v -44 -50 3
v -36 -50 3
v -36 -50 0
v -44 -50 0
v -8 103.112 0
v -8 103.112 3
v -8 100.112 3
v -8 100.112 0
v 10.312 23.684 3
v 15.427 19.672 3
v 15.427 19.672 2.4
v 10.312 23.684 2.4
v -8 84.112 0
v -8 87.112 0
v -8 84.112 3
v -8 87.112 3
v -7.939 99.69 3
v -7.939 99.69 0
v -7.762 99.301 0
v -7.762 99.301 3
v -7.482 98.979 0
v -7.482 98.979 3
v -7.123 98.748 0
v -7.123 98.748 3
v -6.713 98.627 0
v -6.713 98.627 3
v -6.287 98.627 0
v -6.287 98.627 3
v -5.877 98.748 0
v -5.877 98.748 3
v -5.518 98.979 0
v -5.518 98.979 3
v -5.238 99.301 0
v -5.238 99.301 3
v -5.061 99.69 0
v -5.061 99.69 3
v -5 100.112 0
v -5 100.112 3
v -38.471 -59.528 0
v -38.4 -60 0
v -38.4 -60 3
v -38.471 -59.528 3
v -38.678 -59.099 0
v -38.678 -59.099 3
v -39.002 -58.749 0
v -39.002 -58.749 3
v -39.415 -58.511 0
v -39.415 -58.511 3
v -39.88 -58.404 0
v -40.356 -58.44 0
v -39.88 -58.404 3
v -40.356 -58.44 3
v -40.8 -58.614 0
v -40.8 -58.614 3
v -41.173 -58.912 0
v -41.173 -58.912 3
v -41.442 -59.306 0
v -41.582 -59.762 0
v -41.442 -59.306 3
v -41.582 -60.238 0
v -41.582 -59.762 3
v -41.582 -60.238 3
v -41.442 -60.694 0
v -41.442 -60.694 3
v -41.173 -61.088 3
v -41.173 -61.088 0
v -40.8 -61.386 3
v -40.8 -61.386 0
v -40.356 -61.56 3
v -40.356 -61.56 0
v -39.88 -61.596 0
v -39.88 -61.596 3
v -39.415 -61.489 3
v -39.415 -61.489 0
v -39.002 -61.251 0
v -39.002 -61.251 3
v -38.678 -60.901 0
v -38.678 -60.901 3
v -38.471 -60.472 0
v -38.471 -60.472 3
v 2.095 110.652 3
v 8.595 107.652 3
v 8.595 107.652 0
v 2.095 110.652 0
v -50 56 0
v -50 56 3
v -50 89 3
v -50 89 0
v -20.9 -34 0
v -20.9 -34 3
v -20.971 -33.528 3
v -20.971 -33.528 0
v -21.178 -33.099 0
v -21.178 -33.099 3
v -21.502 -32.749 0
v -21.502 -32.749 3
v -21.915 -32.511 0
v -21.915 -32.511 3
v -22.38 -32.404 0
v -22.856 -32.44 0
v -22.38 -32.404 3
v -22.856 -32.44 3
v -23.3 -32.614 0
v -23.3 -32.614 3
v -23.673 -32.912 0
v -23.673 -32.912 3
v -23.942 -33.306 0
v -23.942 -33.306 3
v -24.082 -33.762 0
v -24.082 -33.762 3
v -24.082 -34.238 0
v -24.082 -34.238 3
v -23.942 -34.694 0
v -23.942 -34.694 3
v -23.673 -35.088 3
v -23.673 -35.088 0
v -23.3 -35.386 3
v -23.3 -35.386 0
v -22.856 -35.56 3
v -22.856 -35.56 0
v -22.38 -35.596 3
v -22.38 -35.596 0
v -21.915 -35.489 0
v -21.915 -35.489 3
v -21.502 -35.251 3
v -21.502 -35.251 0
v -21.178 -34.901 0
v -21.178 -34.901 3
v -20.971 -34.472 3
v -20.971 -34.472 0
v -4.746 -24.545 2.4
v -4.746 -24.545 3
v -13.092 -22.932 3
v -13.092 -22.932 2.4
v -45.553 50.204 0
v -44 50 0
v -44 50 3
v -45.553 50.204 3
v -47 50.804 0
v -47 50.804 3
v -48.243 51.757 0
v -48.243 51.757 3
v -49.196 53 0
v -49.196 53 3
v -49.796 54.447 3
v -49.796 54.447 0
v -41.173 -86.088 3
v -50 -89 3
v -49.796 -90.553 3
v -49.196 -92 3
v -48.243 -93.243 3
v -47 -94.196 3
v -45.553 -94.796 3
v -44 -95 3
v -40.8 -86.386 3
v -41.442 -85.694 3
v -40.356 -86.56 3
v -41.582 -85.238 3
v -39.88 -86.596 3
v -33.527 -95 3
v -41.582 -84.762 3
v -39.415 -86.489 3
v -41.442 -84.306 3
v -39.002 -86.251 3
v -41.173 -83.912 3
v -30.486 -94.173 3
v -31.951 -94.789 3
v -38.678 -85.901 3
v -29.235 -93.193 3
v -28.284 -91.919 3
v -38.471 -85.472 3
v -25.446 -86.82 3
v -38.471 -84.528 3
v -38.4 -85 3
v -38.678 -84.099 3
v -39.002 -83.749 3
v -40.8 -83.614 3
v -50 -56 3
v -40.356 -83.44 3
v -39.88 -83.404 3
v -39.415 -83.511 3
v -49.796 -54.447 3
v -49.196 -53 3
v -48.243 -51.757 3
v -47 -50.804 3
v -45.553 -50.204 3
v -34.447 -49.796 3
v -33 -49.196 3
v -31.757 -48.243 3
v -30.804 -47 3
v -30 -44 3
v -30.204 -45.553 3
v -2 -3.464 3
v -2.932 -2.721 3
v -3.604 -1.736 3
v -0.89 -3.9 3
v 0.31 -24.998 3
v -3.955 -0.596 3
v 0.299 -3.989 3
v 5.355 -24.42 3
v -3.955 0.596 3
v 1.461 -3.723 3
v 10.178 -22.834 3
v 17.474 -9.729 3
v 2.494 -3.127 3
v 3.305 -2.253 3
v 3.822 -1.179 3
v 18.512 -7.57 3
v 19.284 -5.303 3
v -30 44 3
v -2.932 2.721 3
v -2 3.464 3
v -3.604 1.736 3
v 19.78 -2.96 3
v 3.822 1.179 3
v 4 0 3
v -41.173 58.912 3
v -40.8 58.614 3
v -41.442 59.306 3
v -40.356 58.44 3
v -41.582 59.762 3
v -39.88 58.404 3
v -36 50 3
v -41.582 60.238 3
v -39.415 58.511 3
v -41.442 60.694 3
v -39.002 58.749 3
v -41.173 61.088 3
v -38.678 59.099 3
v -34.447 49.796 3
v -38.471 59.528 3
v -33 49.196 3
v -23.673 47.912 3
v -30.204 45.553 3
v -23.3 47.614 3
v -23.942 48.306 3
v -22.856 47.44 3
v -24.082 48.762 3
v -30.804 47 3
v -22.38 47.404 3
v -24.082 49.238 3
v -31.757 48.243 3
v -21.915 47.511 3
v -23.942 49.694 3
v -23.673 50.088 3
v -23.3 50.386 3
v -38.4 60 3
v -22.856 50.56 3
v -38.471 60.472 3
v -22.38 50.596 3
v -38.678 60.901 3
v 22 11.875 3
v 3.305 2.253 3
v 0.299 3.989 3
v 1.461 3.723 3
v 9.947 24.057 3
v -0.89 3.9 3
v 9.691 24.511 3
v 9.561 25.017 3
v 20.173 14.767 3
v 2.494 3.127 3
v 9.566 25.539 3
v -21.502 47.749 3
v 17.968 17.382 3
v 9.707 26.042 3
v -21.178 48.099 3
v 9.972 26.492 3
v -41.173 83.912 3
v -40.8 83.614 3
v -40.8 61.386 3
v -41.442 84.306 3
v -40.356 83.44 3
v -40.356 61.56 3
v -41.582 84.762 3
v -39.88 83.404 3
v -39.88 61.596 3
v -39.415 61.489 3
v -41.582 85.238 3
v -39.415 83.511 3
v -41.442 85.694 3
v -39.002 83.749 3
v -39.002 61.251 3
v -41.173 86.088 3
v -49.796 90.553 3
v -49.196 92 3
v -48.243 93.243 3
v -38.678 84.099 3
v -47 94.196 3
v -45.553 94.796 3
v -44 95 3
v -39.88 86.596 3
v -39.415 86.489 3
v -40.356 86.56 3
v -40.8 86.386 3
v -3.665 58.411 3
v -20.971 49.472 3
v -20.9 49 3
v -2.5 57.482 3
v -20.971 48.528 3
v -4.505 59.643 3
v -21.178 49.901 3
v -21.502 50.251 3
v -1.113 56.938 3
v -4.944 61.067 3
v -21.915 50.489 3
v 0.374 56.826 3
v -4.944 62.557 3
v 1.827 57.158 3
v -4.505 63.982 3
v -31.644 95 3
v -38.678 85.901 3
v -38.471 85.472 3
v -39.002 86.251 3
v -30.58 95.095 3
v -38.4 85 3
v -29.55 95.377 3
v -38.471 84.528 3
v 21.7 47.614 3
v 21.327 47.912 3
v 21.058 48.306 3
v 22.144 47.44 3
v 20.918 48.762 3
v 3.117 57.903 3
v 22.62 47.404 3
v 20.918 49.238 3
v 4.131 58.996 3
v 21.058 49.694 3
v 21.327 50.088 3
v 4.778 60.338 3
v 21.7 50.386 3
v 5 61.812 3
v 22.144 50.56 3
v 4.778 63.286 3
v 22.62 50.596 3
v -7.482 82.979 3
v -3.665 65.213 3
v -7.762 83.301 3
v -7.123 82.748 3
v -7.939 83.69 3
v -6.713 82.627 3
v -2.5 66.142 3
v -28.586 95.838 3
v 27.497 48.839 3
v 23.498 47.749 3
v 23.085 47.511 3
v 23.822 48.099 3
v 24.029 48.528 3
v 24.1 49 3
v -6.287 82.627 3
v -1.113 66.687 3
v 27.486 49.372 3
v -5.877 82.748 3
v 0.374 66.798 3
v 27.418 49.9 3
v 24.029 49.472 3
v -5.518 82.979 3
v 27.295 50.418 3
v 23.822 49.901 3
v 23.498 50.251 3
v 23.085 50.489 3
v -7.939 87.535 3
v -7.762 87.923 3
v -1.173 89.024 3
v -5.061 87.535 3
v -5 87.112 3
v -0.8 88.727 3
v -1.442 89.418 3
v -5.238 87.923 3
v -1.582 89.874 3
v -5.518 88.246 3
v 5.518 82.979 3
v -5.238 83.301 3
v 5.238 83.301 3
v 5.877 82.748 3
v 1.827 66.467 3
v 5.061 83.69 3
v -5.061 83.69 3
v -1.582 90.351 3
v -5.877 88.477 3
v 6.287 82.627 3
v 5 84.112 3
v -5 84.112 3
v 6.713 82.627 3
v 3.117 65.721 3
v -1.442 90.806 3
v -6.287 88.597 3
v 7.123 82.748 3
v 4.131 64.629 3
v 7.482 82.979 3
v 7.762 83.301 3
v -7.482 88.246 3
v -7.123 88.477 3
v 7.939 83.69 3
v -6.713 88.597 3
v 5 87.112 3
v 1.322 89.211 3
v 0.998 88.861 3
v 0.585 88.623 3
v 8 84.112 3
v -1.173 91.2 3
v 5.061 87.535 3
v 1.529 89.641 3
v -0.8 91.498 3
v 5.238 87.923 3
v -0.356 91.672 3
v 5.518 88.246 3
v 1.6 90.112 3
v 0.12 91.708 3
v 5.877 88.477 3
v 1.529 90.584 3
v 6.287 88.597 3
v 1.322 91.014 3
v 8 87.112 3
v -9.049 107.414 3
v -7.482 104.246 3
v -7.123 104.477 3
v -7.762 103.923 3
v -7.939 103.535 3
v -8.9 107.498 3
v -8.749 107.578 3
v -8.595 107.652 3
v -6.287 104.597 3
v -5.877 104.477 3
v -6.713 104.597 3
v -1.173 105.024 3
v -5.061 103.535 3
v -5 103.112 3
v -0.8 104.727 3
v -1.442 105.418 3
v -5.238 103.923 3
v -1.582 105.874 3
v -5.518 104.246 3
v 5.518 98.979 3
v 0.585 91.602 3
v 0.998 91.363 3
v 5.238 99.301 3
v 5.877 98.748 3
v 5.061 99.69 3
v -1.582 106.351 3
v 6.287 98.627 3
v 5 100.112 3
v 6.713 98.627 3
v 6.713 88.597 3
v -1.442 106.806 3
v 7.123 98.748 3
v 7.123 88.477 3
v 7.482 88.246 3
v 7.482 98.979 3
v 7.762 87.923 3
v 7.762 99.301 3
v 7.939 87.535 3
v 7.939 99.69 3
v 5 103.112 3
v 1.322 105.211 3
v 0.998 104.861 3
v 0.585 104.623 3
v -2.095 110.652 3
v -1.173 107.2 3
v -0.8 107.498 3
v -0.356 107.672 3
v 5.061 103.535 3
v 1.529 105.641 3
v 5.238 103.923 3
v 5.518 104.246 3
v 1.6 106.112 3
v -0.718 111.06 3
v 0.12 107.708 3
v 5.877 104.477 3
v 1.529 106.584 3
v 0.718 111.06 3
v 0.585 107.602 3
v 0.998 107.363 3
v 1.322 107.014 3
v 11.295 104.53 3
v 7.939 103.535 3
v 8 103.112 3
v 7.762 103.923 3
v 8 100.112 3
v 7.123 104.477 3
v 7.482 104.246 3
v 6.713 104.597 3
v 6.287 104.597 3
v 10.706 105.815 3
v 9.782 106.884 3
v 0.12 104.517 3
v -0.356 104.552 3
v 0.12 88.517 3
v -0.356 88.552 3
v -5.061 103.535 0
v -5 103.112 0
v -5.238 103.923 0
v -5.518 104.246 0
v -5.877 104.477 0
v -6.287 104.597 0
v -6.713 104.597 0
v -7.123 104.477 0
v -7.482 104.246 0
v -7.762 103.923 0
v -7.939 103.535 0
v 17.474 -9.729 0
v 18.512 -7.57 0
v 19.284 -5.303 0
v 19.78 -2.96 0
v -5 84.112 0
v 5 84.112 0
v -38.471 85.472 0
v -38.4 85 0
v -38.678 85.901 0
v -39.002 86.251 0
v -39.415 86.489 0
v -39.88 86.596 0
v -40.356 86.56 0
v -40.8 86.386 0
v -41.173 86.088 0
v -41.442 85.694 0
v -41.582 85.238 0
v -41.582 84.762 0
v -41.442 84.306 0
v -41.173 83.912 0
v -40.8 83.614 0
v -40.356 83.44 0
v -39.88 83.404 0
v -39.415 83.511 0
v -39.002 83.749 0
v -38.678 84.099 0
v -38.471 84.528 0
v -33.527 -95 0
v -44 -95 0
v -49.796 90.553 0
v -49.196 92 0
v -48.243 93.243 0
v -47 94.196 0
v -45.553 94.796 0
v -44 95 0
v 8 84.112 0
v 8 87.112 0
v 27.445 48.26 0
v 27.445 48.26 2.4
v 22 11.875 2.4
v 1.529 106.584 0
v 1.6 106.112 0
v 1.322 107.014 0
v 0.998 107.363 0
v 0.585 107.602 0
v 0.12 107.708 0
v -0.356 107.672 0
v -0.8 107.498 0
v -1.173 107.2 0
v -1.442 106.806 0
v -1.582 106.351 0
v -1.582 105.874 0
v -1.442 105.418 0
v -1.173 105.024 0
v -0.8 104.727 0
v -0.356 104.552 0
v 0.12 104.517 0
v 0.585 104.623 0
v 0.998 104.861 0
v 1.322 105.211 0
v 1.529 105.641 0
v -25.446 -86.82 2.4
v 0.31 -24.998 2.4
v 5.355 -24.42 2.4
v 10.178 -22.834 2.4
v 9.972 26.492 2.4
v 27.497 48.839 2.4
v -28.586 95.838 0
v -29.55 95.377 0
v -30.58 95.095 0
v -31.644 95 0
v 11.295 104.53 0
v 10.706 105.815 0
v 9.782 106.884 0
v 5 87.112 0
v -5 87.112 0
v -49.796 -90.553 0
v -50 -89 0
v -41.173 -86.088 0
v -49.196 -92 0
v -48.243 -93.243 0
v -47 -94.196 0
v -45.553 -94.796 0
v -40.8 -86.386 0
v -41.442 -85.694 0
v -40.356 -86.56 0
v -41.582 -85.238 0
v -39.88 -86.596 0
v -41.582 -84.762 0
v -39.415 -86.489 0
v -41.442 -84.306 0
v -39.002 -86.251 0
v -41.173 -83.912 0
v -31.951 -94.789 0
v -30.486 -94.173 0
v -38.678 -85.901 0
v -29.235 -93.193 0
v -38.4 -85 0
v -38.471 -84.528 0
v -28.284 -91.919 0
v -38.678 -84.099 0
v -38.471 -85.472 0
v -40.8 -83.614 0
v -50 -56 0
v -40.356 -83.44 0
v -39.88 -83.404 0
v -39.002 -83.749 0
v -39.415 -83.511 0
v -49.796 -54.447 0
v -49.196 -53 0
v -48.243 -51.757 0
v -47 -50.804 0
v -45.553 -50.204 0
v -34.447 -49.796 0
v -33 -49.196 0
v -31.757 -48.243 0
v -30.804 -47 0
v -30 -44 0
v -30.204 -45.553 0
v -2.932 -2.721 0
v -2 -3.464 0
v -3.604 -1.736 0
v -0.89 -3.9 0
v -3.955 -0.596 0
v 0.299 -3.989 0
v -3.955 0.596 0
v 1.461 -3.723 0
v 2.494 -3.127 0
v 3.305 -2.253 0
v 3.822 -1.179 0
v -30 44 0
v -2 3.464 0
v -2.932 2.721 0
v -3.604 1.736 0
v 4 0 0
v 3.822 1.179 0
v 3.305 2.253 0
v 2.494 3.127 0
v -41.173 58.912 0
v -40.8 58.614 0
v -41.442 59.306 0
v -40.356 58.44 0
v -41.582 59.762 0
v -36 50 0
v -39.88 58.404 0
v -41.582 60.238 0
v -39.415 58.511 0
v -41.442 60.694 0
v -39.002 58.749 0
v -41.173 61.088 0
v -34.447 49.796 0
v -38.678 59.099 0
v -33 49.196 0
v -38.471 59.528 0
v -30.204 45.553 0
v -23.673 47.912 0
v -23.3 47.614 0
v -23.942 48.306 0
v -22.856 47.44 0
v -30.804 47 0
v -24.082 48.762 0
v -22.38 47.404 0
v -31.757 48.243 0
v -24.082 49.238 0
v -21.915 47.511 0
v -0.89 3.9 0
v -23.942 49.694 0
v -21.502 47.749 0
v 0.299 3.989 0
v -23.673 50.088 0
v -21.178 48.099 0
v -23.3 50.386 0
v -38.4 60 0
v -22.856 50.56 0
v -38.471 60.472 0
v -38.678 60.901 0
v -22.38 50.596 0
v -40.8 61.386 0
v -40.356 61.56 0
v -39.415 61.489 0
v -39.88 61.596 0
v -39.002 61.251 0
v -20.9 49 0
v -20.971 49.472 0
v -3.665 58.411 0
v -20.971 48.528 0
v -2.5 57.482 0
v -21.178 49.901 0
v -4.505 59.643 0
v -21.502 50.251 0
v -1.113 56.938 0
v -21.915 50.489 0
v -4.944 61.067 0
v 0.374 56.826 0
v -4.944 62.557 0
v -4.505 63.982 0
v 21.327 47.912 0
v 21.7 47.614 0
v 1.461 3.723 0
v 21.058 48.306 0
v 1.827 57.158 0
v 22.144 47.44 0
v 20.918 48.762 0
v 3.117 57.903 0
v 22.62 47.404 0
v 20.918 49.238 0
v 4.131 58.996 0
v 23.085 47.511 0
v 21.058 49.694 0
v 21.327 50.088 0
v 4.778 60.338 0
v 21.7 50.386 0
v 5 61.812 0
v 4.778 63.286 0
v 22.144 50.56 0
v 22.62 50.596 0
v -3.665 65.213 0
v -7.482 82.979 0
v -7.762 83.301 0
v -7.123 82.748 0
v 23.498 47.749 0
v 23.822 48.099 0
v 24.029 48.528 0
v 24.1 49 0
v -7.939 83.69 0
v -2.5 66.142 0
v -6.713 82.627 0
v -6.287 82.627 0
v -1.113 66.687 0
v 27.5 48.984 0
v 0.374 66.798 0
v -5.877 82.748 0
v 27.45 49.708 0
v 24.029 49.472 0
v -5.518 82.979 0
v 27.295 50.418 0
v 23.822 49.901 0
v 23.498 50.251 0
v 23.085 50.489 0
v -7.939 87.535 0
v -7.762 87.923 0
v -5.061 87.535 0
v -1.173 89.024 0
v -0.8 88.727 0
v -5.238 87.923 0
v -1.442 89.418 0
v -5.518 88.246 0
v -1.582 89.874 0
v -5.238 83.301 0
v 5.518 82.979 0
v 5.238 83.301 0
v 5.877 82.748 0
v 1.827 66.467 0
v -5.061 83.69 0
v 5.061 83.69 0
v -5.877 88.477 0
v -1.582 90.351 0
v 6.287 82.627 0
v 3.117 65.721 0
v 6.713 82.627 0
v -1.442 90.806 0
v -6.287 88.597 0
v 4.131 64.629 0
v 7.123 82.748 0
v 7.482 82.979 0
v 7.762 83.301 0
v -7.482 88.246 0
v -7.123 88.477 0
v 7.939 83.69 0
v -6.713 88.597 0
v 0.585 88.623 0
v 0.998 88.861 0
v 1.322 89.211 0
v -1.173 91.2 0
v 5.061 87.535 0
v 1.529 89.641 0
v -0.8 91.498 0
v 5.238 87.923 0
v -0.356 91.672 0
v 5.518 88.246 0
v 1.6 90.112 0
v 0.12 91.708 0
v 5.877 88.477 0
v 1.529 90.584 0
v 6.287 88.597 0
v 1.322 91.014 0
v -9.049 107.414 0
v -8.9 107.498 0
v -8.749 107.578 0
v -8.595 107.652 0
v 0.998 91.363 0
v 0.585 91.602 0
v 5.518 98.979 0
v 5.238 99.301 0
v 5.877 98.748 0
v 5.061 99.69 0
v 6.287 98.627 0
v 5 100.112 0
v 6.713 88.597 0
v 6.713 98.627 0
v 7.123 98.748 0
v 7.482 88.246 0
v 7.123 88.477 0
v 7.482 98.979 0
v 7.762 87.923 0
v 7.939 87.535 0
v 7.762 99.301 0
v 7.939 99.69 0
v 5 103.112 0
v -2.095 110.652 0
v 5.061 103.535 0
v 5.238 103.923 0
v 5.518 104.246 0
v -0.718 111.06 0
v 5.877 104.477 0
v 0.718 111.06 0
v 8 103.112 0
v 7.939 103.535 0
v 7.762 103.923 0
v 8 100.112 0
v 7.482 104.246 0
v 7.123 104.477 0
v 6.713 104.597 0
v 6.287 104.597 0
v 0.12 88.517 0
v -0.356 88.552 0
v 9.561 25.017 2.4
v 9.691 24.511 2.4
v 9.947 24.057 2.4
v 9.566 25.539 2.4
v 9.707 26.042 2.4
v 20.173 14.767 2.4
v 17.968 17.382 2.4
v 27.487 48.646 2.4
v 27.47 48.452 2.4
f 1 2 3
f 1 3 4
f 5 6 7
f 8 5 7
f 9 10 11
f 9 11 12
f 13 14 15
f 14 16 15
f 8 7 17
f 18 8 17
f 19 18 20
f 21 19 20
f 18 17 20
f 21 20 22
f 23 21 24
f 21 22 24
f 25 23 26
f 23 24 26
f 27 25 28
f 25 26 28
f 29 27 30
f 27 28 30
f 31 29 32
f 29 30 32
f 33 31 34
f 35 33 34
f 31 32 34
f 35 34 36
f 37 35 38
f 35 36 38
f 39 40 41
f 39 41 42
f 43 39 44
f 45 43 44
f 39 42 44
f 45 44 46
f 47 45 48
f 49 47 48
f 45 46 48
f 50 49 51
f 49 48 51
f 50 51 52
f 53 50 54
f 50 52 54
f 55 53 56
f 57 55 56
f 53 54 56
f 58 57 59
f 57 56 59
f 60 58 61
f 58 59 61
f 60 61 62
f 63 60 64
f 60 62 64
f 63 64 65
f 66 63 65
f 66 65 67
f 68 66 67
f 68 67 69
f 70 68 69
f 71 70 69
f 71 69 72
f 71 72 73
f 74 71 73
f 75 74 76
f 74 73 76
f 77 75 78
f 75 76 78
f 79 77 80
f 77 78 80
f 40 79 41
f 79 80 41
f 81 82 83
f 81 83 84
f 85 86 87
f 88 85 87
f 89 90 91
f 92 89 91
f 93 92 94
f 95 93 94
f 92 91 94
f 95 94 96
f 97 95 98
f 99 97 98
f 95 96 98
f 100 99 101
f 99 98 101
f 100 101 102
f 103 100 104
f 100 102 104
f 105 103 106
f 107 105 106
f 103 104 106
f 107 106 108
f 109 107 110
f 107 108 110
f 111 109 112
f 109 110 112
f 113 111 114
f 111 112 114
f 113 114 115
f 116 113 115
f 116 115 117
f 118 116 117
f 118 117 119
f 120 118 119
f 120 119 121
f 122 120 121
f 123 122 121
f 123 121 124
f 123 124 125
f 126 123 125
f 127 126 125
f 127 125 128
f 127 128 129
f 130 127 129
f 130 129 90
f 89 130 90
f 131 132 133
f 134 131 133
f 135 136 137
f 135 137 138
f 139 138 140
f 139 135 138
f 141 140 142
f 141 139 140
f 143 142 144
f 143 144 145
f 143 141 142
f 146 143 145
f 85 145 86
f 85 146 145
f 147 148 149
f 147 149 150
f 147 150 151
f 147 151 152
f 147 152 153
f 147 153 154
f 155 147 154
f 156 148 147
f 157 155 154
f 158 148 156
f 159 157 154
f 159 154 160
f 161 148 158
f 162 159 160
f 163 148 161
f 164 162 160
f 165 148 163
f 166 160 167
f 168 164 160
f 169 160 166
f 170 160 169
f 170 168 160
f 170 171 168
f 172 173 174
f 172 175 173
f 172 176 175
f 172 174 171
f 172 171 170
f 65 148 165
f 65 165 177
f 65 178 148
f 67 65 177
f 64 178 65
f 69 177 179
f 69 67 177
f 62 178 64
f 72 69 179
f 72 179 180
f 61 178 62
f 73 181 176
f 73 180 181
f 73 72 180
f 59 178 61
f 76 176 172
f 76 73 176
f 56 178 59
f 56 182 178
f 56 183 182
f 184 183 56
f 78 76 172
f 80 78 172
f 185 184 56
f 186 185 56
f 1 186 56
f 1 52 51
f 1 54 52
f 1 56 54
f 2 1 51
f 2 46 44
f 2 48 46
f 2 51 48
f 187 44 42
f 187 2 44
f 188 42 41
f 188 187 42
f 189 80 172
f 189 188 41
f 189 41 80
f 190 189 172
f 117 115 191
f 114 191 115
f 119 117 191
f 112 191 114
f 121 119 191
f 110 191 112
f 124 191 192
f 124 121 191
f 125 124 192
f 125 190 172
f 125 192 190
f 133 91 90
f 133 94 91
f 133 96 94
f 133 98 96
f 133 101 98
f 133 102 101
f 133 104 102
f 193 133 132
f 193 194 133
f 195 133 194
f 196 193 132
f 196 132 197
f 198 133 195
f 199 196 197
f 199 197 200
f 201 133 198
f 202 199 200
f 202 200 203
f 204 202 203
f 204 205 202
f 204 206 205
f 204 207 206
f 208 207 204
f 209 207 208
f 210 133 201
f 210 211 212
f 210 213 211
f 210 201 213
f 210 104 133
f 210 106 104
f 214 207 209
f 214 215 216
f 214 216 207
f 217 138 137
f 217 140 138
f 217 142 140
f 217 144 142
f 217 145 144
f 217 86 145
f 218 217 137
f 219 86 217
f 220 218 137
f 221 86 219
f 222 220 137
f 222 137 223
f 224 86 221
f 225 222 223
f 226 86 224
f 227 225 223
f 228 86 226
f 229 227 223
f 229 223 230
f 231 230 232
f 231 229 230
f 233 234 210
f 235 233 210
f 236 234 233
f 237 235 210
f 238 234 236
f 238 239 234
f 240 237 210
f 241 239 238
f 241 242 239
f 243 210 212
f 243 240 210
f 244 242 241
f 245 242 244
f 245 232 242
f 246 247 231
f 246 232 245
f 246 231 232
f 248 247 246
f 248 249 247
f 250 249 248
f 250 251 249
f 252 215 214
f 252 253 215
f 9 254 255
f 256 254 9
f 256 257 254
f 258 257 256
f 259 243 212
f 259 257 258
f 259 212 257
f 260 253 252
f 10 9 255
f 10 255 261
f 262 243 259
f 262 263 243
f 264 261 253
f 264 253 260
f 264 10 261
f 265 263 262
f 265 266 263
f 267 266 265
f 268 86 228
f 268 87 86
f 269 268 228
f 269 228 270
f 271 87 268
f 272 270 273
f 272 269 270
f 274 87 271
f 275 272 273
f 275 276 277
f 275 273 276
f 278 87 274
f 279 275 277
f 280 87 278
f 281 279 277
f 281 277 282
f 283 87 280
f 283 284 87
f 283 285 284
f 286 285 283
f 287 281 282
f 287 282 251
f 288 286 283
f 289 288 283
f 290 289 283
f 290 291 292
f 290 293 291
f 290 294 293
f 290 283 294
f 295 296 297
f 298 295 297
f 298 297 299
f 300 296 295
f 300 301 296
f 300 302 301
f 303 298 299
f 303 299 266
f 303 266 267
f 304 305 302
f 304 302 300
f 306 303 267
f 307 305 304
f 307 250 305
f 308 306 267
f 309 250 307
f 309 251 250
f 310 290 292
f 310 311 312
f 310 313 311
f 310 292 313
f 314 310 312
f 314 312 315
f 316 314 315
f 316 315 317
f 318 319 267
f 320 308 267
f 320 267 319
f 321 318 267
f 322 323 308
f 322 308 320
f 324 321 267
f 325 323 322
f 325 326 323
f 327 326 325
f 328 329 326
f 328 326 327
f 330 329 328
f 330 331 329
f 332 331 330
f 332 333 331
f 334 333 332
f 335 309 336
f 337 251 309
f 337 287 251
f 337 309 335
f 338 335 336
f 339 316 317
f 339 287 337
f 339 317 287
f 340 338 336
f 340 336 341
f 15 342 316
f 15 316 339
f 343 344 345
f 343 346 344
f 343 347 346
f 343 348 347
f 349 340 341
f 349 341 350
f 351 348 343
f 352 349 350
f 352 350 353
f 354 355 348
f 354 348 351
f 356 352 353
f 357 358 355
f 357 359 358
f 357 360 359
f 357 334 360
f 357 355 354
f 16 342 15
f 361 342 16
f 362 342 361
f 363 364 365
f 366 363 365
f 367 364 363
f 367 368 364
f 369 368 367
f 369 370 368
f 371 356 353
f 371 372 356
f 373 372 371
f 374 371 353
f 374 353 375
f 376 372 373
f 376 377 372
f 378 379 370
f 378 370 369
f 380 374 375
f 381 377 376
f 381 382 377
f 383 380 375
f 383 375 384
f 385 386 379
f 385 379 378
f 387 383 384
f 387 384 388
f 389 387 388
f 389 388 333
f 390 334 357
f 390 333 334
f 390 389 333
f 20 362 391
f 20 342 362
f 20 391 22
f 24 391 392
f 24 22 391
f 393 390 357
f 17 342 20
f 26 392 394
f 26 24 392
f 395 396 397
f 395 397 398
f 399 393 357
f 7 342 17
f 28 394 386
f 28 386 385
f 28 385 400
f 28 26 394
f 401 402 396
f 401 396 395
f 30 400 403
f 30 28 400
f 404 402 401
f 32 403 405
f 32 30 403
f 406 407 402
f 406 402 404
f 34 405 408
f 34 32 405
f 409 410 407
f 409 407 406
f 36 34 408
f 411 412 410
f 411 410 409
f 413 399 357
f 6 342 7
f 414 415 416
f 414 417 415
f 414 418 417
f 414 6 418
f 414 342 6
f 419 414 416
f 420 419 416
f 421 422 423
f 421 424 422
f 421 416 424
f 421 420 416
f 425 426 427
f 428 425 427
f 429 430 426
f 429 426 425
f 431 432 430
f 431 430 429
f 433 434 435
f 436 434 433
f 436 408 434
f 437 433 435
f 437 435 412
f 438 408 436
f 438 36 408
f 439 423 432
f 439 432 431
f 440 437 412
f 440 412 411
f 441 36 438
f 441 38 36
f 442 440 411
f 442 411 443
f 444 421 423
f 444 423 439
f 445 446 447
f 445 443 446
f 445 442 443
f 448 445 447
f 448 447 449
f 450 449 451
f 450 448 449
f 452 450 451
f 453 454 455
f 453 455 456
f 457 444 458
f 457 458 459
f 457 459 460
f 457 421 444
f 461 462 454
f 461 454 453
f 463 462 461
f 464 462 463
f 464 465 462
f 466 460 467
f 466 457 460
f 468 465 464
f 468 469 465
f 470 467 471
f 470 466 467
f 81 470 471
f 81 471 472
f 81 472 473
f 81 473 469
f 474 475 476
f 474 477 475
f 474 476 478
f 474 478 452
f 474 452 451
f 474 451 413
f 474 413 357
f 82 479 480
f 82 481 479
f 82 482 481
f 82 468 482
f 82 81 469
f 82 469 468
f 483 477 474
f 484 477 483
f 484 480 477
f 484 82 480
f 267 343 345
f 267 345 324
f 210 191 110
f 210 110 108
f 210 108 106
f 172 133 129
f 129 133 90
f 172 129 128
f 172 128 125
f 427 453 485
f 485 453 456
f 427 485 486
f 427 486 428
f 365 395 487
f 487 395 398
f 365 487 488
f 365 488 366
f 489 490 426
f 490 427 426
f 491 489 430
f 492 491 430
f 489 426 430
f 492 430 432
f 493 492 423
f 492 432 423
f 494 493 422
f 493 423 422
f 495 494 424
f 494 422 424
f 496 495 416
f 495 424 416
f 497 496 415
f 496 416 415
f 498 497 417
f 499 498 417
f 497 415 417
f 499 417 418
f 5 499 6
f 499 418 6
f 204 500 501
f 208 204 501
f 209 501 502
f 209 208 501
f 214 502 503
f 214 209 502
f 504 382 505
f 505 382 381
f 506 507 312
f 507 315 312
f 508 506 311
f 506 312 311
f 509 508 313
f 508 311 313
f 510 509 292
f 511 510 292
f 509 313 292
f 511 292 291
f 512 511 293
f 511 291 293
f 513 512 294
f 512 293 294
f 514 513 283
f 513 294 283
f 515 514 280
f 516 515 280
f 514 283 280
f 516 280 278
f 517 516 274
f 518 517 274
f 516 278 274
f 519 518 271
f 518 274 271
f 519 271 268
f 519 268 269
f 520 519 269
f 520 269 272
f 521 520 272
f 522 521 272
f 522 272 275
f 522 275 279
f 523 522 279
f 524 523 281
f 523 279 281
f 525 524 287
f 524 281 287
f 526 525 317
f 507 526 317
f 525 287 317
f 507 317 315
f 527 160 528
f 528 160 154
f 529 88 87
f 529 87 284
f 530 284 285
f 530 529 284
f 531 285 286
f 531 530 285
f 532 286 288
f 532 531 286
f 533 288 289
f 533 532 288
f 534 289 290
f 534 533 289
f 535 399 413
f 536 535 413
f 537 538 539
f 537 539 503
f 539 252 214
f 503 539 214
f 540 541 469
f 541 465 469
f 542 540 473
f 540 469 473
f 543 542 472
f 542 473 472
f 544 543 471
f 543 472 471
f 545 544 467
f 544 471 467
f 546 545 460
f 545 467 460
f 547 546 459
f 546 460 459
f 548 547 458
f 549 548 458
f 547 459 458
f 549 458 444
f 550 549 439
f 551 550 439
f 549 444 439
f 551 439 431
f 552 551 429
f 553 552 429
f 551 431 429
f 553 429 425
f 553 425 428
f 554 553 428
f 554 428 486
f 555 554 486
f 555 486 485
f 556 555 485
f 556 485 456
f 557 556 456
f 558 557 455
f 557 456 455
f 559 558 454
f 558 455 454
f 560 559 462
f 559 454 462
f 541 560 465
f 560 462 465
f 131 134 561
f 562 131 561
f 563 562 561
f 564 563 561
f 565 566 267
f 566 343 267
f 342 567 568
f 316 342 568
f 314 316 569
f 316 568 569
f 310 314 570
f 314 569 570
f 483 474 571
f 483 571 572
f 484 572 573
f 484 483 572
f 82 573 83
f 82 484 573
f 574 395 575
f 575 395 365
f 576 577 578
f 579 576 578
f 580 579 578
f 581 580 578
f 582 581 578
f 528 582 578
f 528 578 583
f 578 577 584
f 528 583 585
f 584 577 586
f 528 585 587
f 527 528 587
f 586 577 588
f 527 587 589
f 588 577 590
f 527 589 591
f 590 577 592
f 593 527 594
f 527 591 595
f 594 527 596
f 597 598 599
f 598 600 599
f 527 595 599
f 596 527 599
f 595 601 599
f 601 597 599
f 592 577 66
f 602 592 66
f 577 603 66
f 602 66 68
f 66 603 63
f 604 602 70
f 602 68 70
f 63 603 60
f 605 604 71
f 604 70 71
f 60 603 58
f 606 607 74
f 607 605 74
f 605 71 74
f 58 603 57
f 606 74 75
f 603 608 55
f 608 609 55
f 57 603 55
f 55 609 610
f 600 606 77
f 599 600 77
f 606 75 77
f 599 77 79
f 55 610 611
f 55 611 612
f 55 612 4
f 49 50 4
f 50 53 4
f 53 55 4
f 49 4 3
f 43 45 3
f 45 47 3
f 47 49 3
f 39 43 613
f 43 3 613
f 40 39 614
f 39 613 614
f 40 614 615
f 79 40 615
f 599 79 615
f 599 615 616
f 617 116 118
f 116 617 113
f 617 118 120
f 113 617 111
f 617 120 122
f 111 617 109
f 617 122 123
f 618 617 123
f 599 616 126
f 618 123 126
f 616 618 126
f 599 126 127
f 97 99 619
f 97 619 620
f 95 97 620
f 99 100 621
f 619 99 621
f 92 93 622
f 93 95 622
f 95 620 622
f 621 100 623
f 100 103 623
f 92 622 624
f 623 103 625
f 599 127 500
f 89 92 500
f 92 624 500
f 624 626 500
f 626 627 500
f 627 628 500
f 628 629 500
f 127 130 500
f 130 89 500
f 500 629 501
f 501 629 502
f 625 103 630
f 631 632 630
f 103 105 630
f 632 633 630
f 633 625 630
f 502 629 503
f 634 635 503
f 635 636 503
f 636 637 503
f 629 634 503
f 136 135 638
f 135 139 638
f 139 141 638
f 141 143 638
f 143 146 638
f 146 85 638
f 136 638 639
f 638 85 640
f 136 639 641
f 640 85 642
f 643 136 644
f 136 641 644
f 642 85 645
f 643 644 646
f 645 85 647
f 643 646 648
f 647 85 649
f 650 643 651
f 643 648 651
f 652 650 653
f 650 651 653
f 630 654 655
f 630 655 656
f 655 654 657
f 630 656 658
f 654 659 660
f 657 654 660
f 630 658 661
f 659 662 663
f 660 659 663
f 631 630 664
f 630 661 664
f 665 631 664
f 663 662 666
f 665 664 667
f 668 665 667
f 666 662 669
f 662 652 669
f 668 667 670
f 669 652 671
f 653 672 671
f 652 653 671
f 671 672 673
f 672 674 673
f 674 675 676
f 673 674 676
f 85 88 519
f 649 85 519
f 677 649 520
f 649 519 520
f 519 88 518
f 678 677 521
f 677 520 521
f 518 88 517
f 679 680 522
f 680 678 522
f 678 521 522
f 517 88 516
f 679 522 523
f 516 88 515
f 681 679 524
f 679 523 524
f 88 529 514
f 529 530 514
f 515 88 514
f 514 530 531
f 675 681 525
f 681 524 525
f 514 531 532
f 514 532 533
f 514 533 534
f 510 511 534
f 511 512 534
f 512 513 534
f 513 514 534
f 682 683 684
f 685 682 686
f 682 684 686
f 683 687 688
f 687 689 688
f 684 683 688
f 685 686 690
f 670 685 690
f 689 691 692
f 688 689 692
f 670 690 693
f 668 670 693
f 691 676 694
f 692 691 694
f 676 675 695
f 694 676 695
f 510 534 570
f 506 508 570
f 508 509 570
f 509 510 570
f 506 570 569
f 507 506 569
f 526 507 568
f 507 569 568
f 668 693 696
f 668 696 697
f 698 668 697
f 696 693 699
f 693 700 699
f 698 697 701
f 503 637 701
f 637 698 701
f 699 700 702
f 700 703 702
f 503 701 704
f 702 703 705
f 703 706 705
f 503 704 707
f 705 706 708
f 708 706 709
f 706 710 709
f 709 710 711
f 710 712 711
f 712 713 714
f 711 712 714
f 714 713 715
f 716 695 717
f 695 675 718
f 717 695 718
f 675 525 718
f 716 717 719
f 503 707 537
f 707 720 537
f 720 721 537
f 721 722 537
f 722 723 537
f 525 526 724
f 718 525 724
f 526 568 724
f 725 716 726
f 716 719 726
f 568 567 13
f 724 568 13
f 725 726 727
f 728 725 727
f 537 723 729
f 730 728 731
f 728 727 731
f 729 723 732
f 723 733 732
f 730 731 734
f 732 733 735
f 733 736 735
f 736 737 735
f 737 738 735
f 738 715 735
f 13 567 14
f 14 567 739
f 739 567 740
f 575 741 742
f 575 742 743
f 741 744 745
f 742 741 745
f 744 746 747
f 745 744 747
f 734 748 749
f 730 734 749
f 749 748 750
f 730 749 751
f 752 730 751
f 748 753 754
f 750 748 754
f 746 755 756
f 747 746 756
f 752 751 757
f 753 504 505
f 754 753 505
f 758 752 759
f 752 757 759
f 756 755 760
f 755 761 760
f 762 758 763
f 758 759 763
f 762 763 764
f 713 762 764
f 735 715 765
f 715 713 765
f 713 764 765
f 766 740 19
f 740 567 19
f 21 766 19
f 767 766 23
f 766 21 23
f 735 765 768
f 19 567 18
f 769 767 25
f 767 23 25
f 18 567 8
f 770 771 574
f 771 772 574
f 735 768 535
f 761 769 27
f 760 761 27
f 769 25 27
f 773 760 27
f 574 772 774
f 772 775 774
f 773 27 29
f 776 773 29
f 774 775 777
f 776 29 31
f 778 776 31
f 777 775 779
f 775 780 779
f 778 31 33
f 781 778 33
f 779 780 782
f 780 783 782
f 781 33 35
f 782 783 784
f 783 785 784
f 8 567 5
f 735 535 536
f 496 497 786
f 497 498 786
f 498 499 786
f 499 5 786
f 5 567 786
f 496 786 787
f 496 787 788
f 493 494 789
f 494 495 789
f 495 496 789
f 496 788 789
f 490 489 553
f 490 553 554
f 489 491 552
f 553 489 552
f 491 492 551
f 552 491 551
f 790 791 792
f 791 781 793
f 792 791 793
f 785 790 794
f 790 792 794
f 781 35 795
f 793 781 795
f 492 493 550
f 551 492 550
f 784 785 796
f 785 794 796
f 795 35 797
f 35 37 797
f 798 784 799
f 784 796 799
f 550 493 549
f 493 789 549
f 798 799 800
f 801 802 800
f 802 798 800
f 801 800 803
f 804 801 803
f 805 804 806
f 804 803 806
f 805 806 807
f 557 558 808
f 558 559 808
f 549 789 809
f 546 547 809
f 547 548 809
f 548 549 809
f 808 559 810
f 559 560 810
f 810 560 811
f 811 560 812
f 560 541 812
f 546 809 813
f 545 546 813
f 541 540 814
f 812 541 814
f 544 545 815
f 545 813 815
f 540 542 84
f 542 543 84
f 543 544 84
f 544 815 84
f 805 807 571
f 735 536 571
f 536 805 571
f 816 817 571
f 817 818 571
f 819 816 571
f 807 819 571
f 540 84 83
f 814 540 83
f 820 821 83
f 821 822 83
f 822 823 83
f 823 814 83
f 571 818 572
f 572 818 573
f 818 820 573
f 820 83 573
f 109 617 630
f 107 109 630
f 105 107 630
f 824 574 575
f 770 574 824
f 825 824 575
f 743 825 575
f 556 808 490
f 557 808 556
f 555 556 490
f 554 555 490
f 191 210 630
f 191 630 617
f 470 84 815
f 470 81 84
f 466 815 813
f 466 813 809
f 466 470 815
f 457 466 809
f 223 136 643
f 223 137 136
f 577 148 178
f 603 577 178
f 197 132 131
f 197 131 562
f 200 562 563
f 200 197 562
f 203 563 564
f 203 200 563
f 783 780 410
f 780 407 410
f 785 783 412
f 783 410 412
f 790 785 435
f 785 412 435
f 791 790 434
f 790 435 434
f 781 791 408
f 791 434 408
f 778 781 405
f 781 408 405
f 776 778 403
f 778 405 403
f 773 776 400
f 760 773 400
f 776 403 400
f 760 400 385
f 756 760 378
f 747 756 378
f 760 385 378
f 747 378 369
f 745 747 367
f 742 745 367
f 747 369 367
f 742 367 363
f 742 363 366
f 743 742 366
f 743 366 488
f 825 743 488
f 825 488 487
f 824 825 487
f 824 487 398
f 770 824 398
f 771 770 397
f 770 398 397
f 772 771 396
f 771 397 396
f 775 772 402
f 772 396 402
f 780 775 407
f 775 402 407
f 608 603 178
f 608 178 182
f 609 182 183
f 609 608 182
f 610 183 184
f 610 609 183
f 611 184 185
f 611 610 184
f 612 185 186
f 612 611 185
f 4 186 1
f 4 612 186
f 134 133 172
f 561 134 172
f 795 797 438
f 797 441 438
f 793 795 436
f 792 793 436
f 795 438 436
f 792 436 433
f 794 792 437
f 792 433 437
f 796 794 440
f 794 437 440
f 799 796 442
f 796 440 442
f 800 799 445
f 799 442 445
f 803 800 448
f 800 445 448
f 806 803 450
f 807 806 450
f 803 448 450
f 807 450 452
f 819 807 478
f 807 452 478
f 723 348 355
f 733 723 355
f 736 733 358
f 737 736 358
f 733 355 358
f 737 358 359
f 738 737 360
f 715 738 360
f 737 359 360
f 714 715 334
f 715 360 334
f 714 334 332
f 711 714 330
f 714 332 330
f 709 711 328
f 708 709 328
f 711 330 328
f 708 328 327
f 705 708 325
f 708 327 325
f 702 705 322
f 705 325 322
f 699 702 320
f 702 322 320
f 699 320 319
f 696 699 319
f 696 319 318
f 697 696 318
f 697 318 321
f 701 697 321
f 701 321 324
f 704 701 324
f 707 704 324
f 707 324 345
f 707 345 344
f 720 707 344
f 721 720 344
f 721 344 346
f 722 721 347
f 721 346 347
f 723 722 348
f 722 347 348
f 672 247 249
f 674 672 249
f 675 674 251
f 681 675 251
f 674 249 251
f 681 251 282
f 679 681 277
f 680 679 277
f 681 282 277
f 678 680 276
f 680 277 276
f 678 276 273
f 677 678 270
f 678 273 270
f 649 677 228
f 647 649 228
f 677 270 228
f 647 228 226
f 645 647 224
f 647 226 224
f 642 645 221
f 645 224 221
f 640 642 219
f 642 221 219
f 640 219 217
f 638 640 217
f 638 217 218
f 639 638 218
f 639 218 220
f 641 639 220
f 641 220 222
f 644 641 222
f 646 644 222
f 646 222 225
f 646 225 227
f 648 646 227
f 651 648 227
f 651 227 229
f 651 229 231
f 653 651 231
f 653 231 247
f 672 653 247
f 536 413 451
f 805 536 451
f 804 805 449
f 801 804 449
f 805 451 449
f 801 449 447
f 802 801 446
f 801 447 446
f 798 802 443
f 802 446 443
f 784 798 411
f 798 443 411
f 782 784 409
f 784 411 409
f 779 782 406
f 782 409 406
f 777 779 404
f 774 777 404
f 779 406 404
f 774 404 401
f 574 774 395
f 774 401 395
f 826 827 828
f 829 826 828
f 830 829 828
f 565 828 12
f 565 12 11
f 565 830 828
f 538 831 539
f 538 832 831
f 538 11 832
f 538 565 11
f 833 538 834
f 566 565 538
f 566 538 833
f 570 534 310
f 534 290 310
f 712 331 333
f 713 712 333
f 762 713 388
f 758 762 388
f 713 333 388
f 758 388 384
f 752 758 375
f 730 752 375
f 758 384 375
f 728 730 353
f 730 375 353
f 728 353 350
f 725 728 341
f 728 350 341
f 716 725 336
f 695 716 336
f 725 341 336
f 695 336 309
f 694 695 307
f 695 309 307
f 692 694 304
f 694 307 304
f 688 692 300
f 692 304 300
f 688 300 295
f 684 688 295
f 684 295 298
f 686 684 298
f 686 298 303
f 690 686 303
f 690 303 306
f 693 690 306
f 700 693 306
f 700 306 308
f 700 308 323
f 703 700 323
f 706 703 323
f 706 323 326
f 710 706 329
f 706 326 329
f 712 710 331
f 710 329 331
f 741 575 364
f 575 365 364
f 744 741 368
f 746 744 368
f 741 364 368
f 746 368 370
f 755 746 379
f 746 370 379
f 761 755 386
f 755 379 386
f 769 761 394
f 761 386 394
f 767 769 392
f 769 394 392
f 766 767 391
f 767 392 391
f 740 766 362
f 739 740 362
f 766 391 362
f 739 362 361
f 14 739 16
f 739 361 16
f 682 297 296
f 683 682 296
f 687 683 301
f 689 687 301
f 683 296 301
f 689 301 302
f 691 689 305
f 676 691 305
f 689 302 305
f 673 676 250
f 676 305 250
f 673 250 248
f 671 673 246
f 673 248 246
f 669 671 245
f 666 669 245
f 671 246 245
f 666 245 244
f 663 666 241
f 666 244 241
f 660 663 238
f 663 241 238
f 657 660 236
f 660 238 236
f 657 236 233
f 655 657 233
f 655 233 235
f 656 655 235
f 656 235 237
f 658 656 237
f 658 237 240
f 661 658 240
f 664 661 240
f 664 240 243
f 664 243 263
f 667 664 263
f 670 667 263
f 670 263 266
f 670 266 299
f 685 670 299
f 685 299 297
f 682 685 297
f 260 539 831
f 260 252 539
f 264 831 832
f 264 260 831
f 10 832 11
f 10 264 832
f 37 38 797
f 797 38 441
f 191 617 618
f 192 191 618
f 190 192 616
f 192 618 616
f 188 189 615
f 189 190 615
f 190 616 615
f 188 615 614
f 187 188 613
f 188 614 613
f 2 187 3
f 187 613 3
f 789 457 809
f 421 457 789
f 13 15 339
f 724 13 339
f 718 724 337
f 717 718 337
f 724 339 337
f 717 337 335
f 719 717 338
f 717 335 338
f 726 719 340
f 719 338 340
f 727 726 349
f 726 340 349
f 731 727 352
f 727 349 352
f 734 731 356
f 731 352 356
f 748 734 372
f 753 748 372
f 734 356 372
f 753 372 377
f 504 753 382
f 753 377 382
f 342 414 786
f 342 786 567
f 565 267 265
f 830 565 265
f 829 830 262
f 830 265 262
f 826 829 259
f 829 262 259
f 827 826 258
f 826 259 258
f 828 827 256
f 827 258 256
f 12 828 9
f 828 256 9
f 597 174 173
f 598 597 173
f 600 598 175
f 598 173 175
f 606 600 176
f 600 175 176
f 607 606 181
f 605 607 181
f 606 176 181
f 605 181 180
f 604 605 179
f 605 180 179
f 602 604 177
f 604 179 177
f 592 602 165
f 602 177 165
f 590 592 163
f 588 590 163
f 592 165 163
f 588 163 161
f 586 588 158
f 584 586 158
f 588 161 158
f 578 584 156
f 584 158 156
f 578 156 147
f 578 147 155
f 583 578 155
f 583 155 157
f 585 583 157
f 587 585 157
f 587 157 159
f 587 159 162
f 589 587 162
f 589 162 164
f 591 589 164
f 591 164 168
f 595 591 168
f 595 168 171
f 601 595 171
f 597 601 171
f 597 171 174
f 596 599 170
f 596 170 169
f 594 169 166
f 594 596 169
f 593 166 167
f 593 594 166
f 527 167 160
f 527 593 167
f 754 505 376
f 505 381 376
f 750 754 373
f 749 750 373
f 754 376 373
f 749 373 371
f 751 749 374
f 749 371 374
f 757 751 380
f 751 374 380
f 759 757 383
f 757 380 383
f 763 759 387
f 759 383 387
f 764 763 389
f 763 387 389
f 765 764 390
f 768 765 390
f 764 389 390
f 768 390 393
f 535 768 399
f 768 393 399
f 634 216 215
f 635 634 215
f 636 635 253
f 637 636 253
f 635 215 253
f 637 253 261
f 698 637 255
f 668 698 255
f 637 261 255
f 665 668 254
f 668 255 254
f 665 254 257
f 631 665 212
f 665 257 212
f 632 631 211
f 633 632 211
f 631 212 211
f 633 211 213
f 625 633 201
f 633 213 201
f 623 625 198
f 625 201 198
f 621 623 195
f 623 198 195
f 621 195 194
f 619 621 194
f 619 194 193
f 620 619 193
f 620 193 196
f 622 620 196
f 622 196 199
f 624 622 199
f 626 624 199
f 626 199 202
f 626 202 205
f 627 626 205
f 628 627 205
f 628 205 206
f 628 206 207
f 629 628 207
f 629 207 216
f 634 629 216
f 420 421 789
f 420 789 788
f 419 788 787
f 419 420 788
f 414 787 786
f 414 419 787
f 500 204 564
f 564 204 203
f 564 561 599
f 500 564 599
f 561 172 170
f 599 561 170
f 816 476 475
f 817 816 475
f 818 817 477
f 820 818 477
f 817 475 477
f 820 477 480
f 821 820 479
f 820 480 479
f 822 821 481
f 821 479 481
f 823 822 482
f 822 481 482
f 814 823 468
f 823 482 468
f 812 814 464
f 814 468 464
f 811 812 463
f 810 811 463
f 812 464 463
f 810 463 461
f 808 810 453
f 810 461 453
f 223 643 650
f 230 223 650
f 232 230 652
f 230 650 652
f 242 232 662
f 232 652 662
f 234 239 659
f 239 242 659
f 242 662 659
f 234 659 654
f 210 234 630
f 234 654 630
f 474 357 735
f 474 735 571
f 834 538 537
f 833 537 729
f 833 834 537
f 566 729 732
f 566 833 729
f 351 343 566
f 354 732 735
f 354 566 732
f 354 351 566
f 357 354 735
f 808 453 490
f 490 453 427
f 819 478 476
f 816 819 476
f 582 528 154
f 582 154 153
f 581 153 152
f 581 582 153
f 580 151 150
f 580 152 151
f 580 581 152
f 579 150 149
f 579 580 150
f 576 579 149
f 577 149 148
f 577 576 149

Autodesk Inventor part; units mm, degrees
ref_plane "YZ Plane" through (0, 0, 0) normal (1, 0, 0) x (0, 1, 0)
ref_plane "XZ Plane" through (0, 0, 0) normal (0, 1, 0) x (-1, 0, 0)
ref_plane "XY Plane" through (0, 0, 0) normal (0, 0, 1) x (1, 0, 0)
sketch "スケッチ1" plane through (0, 0, 0) normal (0, 0, 1) x (1, 0, 0)
  arc A0 (0, -120) -> (0, 120) centre (0, 0) ccw
  line L0 (0, 120) -> (0, -120)
  dimension "d0" = 120
extrude "押し出し1" add sketch "スケッチ1" along normal blind 3
sketch "スケッチ2" plane through (0, 0, 0) normal (0, 0, -1) x (-1, 0, 0)
  line L0 (0, 120) -> (0, -120) projected
  line L1 (0, 120) -> (50, 120)
  line L2 (50, 120) -> (50, -120)
  line L3 (50, -120) -> (0, -120)
  line L4 (0, -120) -> (0, 120)
  point P0 (0, 0)
  dimension "d3" = 50
extrude "押し出し2" add sketch "スケッチ2" against normal blind 3
sketch "スケッチ3" plane through (0, 0, 3) normal (0, 0, 1) x (1, 0, 0)
  line L0 (-50, 120) -> (-50, -120) projected
  line L1 (-50, 40) -> (-40, 40)
  line L2 (-40, 40) -> (-40, -40)
  line L3 (-40, -40) -> (-50, -40)
  line L4 (-50, -40) -> (-50, 40)
  line L5 (-40, 60) -> (-40, -60) construction
  circle A0 centre (-40, 60) radius 1.6
  circle A1 centre (-40, -60) radius 1.6
  point P0 (0, 0)
  point P1 (-50, 0)
  point P2 (-40, 0)
  point P3 (-40, 0)
  dimension "d8" = 10
  dimension "d9" = 80
  dimension "d10" = 120
  dimension "d11" = 10
  dimension "d12" = 3.2
  dimension "d13" = 3.2
extrude "押し出し3" cut sketch "スケッチ3" against normal through all
sketch "スケッチ4" plane through (0, 0, 3) normal (0, 0, 1) x (1, 0, 0)
  circle A0 centre (0, 0) radius 4
  dimension "d14" = 8
extrude "押し出し4" cut sketch "スケッチ4" against normal blind 3
sketch "スケッチ5" plane through (0, 0, 3) normal (0, 0, 1) x (1, 0, 0)
  circle A0 centre (0, 61.8122) radius 3 projected
  circle A1 centre (0, 61.8122) radius 5
  point P0 (0, 0)
  dimension "d17" = 10
extrude "押し出し5" cut sketch "スケッチ5" against normal blind 3 contours A0 | A1
sketch "スケッチ7" plane through (0, 0, 3) normal (0, 0, 1) x (1, 0, 0)
  line L0 (15.7, 89.1122) -> (-15.7, 89.1122) projected
  line L1 (8, 87.1122) -> (-8, 87.1122)
  line L2 (-8, 87.1122) -> (-8, 84.1122)
  line L3 (-8, 84.1122) -> (8, 84.1122)
  line L4 (8, 84.1122) -> (8, 87.1122)
  arc A0 (-8, 84.1122) -> (-5, 84.1122) centre (-6.5, 84.1122) ccw
  arc A1 (5, 84.1122) -> (8, 84.1122) centre (6.5, 84.1122) ccw
  arc A2 (8, 87.1122) -> (5, 87.1122) centre (6.5, 87.1122) ccw
  arc A3 (-5, 87.1122) -> (-8, 87.1122) centre (-6.5, 87.1122) ccw
  circle A4 centre (0, 90.1122) radius 1.6
  point P0 (0, 0)
  point P1 (0, 87.1122)
  point P2 (0, 89.1122)
  dimension "d20" = 2
  dimension "d21" = 16
  dimension "d22" = 3
  dimension "d23" = 1.5
  dimension "d26" = 3.2
  dimension "d27" = 3
extrude "押し出し6" cut sketch "スケッチ7" against normal blind 3
pattern_linear "矩形状パターン1" count 2 spacing 16 along (0, 1, 0) of "押し出し6"
sketch "スケッチ9" plane through (0, 0, 3) normal (0, 0, 1) x (1, 0, 0)
  circle A0 centre (0, 61.8122) radius 4 construction
  circle A1 centre (0, 0) radius 4 construction
  circle A2 centre (22.5, 49) radius 1.6 projected
  circle A3 centre (-22.5, -34) radius 1.6 projected
  circle A4 centre (-22.5, 49) radius 1.6 projected
  line L0 (25.0237, 50.6221) -> (12.6183, 69.9225) construction
  arc A5 (12.6183, 69.9225) -> (-12.6183, 69.9226) centre (0, 61.8122) ccw construction
  line L1 (-12.6183, 69.9226) -> (-25.0237, 50.6221) construction
  arc A6 (-25.0237, 50.6221) -> (-25.5, 49) centre (-22.5, 49) ccw construction
  line L2 (-25.5, 49) -> (-25.5, -34) construction
  arc A7 (-25.5, -34) -> (-20.5963, -36.3186) centre (-22.5, -34) ccw construction
  line L3 (-20.5963, -36.3186) -> (9.5184, -11.5931) construction
  arc A8 (9.5184, -11.5931) -> (14.6828, -3.0686) centre (0, 0) ccw construction
  line L4 (14.6828, -3.0686) -> (25.4366, 48.3863) construction
  arc A9 (25.4366, 48.3863) -> (25.0237, 50.6221) centre (22.5, 49) ccw construction
  point P0 (0, 0)
extrude "押し出し8" cut sketch "スケッチ9" against normal blind 3
sketch "スケッチ8" plane through (0, 0, 3) normal (0, 0, 1) x (1, 0, 0)
  arc A0 (17.4743, -9.7287) -> (19.7797, -2.9601) centre (0, 0) ccw
  line L0 (17.4743, -9.7287) -> (-30, -95)
  circle A1 centre (22.5, 49) radius 1.6 projected
  circle A2 centre (-22.5, 49) radius 1.6 projected
  circle A3 centre (-22.5, -34) radius 1.6 projected
  arc A4 (27.4449, 48.26) -> (27.2948, 50.4177) centre (22.5, 49) ccw
  line L1 (27.4449, 48.26) -> (19.7797, -2.9601)
  arc A5 (11.2948, 104.5299) -> (8.5953, 107.652) centre (6.5, 103.1122) ccw
  arc A6 (2.0953, 110.652) -> (-2.0953, 110.652) centre (0, 106.1122) ccw
  line L2 (8.5953, 107.652) -> (2.0953, 110.652)
  line L3 (27.2948, 50.4177) -> (11.2948, 104.5299)
  line L4 (-2.0953, 110.652) -> (-8.5953, 107.652)
  arc A7 (-8.5953, 107.652) -> (-9.0487, 107.4138) centre (-6.5, 103.1122) ccw
  line L5 (-9.0487, 107.4138) -> (-30, 95)
  circle A8 centre (-40, 85) radius 1.6 projected
  line L6 (-50, 50) -> (-30, 50) projected
  line L7 (-30, 95) -> (-30, 50) projected
  line L8 (-50, 95) -> (-30, 95) projected
  line L9 (-50, 50) -> (-50, 95) projected
  circle A9 centre (-40, 60) radius 1.6 projected
  circle A10 centre (-40, -85) radius 1.6 projected
  circle A11 centre (-40, -60) radius 1.6 projected
  line L10 (-30, -50) -> (-50, -50) projected
  line L11 (-50, -95) -> (-50, -50) projected
  line L12 (-30, -95) -> (-50, -95) projected
  line L13 (-30, -50) -> (-30, -95) projected
  line L14 (-30, 50) -> (-30, -50)
  point P0 (-47, -55)
  point P1 (-50, -80)
  point P2 (-35, 50)
  point P3 (-35, 95)
  point P4 (-35, -50)
  point P5 (-35, -95)
  dimension "d41" = 10
  dimension "d44" = 5
  dimension "d48" = 20
extrude "押し出し9" cut sketch "スケッチ8" against normal through all contours L0 L13 L14 L7 L5 A7 L4 A6 L2 A5 L3 A4 L1 A0 | L12 L11 L10 L13 | L6 L9 L8 L7 | A1 | A2 | A3 keep common part
fillet "フィレット2" radius 6 8 edges at (-50, 50, 1.5) (-30, 50, 1.5) (-30, -50, 1.5) (-50, -50, 1.5) (-50, 95, 1.5) (-30, 95, 1.5) (-50, -95, 1.5) (-30, -95, 1.5)
sketch "スケッチ10" plane through (0, 0, 3) normal (0, 0, 1) x (1, 0, 0)
  arc A0 (-33.5268, -95) -> (-28.2845, -91.9186) centre (-33.5268, -89) ccw projected
  line L0 (17.4743, -9.7287) -> (-28.2845, -91.9186) projected
  arc A1 (17.4743, -9.7287) -> (19.7797, -2.9601) centre (0, 0) ccw projected
  line L1 (27.4449, 48.26) -> (19.7797, -2.9601) projected
  arc A2 (27.4449, 48.26) -> (27.2948, 50.4177) centre (22.5, 49) ccw projected
  line L2 (11.2948, 104.5299) -> (27.2948, 50.4177) projected
  arc A3 (11.2948, 104.5299) -> (8.5953, 107.652) centre (6.5, 103.1122) ccw projected
  line L3 (2.0953, 110.652) -> (8.5953, 107.652) projected
  arc A4 (2.0953, 110.652) -> (-2.0953, 110.652) centre (0, 106.1122) ccw projected
  line L4 (-8.5953, 107.652) -> (-2.0953, 110.652) projected
  arc A5 (-8.5953, 107.652) -> (-9.0487, 107.4138) centre (-6.5, 103.1122) ccw projected
  line L5 (-28.5856, 95.8381) -> (-9.0487, 107.4138) projected
  arc A6 (-31.6441, 95) -> (-28.5856, 95.8381) centre (-31.6441, 101) ccw projected
  line L6 (-44, 95) -> (-31.6441, 95) projected
  arc A7 (-44, 95) -> (-50, 89) centre (-44, 89) ccw projected
  line L7 (-50, 89) -> (-50, 56) projected
  arc A8 (-50, 56) -> (-44, 50) centre (-44, 56) ccw projected
  line L8 (-36, 50) -> (-44, 50) projected
  arc A9 (-30, 44) -> (-36, 50) centre (-36, 44) ccw projected
  line L9 (-30, -44) -> (-30, 44) projected
  arc A10 (-36, -50) -> (-30, -44) centre (-36, -44) ccw projected
  line L10 (-44, -50) -> (-36, -50) projected
  arc A11 (-44, -50) -> (-50, -56) centre (-44, -56) ccw projected
  line L11 (-50, -56) -> (-50, -89) projected
  arc A12 (-50, -89) -> (-44, -95) centre (-44, -89) ccw projected
  line L12 (-33.5268, -95) -> (-44, -95) projected
  circle A13 centre (-40, -85) radius 1.6 projected
  circle A14 centre (-40, 85) radius 1.6 projected
  circle A15 centre (-22.5, -34) radius 1.6 projected
  circle A16 centre (22.5, 49) radius 1.6 projected
  circle A17 centre (-22.5, 49) radius 1.6 projected
  circle A18 centre (0, 106.1122) radius 1.6 projected
  arc A19 (8, 103.1122) -> (5, 103.1122) centre (6.5, 103.1122) ccw projected
  line L13 (8, 103.1122) -> (8, 100.1122) projected
  arc A20 (5, 100.1122) -> (8, 100.1122) centre (6.5, 100.1122) ccw projected
  line L14 (5, 100.1122) -> (-5, 100.1122) projected
  arc A21 (-8, 100.1122) -> (-5, 100.1122) centre (-6.5, 100.1122) ccw projected
  line L15 (-8, 100.1122) -> (-8, 103.1122) projected
  arc A22 (-5, 103.1122) -> (-8, 103.1122) centre (-6.5, 103.1122) ccw projected
  line L16 (-5, 103.1122) -> (5, 103.1122) projected
  circle A23 centre (0, 90.1122) radius 1.6 projected
  arc A24 (8, 87.1122) -> (5, 87.1122) centre (6.5, 87.1122) ccw projected
  line L17 (8, 87.1122) -> (8, 84.1122) projected
  arc A25 (5, 84.1122) -> (8, 84.1122) centre (6.5, 84.1122) ccw projected
  line L18 (5, 84.1122) -> (-5, 84.1122) projected
  arc A26 (-8, 84.1122) -> (-5, 84.1122) centre (-6.5, 84.1122) ccw projected
  line L19 (-8, 84.1122) -> (-8, 87.1122) projected
  arc A27 (-5, 87.1122) -> (-8, 87.1122) centre (-6.5, 87.1122) ccw projected
  line L20 (-5, 87.1122) -> (5, 87.1122) projected
  circle A28 centre (0, 61.8122) radius 5 projected
  circle A29 centre (0, 0) radius 4 projected
  circle A30 centre (-40, 60) radius 1.6 projected
  circle A31 centre (-40, -60) radius 1.6 projected
  line L21 (27.4974, 48.8393) -> (9.9725, 26.4915)
  circle A32 centre (66.9129, -143.1316) radius 1.6 projected
  circle A33 centre (14.399, -30.8005) radius 1.6 projected
  circle A34 centre (20.7515, -44.3889) radius 1.6 projected
  circle A35 centre (58.443, -125.0137) radius 1.6 projected
  line L22 (4.2168, -26.7296) -> (17.8052, -20.3771) projected
  line L23 (4.2168, -26.7296) -> (63.5067, -153.555) projected
  line L24 (77.0952, -147.2025) -> (63.5067, -153.555) projected
  line L25 (17.8052, -20.3771) -> (77.0952, -147.2025) projected
  line L26 (15.427, 19.6725) -> (10.3121, 23.6835)
  arc A36 (9.9725, 26.4915) -> (10.3121, 23.6835) centre (11.5463, 25.2573) ccw
  circle A37 centre (-26.1999, -135.4901) radius 1.6 projected
  circle A38 centre (-6.455, -33.3816) radius 1.6 projected
  circle A39 centre (-9.3028, -48.1088) radius 1.6 projected
  circle A40 centre (-23.352, -120.7629) radius 1.6 projected
  line L27 (-12.2998, -24.1032) -> (2.4274, -26.951) projected
  line L28 (-12.2998, -24.1032) -> (-35.0823, -141.9207) projected
  line L29 (-20.3551, -144.7685) -> (-35.0823, -141.9207) projected
  line L30 (2.4274, -26.951) -> (-20.3551, -144.7685) projected
  line L31 (-4.7464, -24.5453) -> (-13.0918, -22.9315)
  line L32 (-13.0918, -22.9315) -> (-25.446, -86.8203)
  arc A41 (-4.7464, -24.5453) -> (10.1778, -22.8345) centre (0, 0) ccw
  arc A42 (21.9998, 11.8747) -> (15.427, 19.6725) centre (0, 0) ccw
  dimension "d54" = 2
  dimension "d55" = 1
  dimension "d56" = 1
  dimension "d57" = 25
extrude "押し出し11" cut sketch "スケッチ10" against normal blind 0.6 contours L32 L31 A41 L0 L22 L23 L30 L27 L28 | L28 L27 L30 L0 | L23 L22 L0 | A42 L26 A36 L21 A2 L1 | A33 | A38 | A39
equation "\"d27\" = d22"
properties part number "Pitch_B" material "アルミニウム"
